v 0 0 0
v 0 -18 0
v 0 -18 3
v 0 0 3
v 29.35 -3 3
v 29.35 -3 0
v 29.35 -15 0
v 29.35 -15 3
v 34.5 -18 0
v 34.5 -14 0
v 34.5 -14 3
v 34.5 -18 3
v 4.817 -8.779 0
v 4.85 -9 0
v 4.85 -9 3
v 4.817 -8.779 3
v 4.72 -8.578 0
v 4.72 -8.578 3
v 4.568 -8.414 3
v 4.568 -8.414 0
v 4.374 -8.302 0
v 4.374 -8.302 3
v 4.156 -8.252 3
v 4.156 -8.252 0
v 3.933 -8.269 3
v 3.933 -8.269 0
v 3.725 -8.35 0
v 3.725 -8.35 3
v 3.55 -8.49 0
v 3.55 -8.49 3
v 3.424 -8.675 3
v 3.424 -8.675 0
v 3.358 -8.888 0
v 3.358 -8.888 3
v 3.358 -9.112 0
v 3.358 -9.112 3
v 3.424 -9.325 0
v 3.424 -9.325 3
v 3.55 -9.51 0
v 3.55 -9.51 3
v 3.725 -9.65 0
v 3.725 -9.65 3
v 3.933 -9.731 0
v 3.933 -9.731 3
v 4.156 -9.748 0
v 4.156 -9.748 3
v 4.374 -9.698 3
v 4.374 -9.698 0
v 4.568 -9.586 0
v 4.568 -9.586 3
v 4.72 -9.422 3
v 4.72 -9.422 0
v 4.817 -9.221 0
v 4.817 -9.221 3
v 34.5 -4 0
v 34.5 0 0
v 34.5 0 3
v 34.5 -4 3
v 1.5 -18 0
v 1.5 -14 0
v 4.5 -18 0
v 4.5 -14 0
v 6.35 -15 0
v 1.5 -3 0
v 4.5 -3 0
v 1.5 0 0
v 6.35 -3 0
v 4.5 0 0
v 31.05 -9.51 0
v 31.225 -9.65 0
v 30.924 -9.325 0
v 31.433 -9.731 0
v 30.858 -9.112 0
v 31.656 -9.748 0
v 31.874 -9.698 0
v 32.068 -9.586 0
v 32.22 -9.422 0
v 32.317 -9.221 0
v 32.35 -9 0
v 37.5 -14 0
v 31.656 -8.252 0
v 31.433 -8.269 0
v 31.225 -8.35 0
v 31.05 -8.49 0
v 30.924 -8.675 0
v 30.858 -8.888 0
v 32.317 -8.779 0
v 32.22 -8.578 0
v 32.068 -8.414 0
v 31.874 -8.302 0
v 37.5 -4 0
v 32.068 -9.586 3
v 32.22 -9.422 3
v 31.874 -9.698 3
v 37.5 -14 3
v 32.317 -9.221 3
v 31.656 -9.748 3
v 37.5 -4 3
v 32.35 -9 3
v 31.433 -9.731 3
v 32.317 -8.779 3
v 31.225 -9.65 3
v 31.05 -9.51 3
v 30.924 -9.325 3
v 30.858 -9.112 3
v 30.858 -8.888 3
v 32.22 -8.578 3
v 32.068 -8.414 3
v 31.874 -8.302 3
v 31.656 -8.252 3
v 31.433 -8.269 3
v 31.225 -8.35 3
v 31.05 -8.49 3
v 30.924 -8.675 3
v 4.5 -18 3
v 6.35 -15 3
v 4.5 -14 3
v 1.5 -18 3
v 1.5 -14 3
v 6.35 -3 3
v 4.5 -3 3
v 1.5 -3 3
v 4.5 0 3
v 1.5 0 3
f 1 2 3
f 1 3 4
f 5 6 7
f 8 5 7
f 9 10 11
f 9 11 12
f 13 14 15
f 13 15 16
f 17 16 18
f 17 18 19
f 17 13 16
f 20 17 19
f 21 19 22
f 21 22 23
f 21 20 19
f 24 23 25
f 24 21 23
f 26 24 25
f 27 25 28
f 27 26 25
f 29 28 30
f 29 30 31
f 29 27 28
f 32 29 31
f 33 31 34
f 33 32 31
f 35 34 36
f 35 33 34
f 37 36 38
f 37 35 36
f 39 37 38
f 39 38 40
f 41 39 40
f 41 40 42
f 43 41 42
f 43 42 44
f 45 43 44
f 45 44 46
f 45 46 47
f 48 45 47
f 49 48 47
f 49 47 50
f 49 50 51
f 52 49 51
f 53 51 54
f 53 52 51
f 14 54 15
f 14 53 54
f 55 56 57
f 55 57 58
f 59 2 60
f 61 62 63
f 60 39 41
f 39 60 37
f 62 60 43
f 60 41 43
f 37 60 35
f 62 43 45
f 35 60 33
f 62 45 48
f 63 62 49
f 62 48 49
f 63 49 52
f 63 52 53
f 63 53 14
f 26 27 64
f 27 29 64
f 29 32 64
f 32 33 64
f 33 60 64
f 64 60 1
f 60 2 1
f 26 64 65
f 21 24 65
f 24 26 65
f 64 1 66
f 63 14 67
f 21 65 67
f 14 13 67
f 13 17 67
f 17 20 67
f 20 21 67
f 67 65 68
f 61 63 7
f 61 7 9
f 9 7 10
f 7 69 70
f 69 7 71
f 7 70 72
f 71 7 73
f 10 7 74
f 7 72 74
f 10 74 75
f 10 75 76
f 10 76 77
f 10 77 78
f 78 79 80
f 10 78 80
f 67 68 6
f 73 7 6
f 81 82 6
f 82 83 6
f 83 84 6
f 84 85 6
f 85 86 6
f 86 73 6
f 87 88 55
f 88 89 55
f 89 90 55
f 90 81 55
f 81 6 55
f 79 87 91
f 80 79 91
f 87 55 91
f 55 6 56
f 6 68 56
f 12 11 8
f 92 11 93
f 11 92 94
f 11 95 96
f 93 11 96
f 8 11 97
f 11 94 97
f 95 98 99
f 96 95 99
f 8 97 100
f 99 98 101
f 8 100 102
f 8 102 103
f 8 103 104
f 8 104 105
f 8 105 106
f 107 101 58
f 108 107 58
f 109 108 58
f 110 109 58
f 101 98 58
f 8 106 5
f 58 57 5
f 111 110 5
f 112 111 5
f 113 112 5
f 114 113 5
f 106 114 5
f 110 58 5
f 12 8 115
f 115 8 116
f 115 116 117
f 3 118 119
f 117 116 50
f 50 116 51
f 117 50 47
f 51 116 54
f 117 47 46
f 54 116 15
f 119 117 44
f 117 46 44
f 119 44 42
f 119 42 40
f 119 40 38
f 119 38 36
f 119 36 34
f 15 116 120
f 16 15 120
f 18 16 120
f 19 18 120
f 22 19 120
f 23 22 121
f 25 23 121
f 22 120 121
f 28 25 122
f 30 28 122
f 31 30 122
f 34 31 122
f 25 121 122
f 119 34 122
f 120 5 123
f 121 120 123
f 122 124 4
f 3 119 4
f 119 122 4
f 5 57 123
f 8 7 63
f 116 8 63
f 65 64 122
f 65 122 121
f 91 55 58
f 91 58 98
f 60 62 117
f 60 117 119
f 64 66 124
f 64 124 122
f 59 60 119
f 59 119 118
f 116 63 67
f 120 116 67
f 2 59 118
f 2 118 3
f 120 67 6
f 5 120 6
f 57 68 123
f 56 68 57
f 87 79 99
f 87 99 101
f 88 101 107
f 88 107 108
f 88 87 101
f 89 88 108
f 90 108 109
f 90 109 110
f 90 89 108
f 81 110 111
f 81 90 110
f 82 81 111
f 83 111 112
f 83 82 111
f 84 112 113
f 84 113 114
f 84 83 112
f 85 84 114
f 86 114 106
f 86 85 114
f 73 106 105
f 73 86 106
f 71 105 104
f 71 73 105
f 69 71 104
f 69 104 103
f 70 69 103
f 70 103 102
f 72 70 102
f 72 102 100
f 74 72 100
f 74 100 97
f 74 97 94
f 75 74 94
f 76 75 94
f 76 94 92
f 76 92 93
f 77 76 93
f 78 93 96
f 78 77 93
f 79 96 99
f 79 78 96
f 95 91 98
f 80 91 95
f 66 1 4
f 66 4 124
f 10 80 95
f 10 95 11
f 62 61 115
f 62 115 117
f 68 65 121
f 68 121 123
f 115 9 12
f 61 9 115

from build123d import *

# Parameters (mm, degrees)
SKETCH_1_R      = 1.5
SKETCH_1_R_2    = 0.75
EXTRUDE_9_DEPTH = 3


with BuildPart() as part:
    # 草图1 → 凸台-拉伸9 (new body)
    # profile 1 of 2: a face of its own
    with BuildSketch(Plane.XY):
        Polygon((37.5, -4), (37.5, -14), (34.5, -14), (34.5, -18), (4.5, -18), (4.5, -14), (1.5, -14), (1.5, -18), (0, -18), (0, 0), (1.5, 0), (1.5, -3), (4.5, -3), (4.5, 0), (34.5, 0), (34.5, -4), align=None)
        with Locations((36, -9)):
            Circle(SKETCH_1_R, mode=Mode.SUBTRACT)
        with Locations((4.1, -9)):
            Circle(SKETCH_1_R_2, mode=Mode.SUBTRACT)
        with Locations((31.6, -9)):
            Circle(SKETCH_1_R_2, mode=Mode.SUBTRACT)
        Polygon((29.35, -15), (6.35, -15), (6.35, -9), (6.35, -3), (29.35, -3), align=None, mode=Mode.SUBTRACT)
    # profile 2 of 2: a face of its own
    with BuildSketch(Plane.XY):
        with Locations((36, -9)):
            Circle(SKETCH_1_R)
    extrude(amount=EXTRUDE_9_DEPTH)


solid = part.part
